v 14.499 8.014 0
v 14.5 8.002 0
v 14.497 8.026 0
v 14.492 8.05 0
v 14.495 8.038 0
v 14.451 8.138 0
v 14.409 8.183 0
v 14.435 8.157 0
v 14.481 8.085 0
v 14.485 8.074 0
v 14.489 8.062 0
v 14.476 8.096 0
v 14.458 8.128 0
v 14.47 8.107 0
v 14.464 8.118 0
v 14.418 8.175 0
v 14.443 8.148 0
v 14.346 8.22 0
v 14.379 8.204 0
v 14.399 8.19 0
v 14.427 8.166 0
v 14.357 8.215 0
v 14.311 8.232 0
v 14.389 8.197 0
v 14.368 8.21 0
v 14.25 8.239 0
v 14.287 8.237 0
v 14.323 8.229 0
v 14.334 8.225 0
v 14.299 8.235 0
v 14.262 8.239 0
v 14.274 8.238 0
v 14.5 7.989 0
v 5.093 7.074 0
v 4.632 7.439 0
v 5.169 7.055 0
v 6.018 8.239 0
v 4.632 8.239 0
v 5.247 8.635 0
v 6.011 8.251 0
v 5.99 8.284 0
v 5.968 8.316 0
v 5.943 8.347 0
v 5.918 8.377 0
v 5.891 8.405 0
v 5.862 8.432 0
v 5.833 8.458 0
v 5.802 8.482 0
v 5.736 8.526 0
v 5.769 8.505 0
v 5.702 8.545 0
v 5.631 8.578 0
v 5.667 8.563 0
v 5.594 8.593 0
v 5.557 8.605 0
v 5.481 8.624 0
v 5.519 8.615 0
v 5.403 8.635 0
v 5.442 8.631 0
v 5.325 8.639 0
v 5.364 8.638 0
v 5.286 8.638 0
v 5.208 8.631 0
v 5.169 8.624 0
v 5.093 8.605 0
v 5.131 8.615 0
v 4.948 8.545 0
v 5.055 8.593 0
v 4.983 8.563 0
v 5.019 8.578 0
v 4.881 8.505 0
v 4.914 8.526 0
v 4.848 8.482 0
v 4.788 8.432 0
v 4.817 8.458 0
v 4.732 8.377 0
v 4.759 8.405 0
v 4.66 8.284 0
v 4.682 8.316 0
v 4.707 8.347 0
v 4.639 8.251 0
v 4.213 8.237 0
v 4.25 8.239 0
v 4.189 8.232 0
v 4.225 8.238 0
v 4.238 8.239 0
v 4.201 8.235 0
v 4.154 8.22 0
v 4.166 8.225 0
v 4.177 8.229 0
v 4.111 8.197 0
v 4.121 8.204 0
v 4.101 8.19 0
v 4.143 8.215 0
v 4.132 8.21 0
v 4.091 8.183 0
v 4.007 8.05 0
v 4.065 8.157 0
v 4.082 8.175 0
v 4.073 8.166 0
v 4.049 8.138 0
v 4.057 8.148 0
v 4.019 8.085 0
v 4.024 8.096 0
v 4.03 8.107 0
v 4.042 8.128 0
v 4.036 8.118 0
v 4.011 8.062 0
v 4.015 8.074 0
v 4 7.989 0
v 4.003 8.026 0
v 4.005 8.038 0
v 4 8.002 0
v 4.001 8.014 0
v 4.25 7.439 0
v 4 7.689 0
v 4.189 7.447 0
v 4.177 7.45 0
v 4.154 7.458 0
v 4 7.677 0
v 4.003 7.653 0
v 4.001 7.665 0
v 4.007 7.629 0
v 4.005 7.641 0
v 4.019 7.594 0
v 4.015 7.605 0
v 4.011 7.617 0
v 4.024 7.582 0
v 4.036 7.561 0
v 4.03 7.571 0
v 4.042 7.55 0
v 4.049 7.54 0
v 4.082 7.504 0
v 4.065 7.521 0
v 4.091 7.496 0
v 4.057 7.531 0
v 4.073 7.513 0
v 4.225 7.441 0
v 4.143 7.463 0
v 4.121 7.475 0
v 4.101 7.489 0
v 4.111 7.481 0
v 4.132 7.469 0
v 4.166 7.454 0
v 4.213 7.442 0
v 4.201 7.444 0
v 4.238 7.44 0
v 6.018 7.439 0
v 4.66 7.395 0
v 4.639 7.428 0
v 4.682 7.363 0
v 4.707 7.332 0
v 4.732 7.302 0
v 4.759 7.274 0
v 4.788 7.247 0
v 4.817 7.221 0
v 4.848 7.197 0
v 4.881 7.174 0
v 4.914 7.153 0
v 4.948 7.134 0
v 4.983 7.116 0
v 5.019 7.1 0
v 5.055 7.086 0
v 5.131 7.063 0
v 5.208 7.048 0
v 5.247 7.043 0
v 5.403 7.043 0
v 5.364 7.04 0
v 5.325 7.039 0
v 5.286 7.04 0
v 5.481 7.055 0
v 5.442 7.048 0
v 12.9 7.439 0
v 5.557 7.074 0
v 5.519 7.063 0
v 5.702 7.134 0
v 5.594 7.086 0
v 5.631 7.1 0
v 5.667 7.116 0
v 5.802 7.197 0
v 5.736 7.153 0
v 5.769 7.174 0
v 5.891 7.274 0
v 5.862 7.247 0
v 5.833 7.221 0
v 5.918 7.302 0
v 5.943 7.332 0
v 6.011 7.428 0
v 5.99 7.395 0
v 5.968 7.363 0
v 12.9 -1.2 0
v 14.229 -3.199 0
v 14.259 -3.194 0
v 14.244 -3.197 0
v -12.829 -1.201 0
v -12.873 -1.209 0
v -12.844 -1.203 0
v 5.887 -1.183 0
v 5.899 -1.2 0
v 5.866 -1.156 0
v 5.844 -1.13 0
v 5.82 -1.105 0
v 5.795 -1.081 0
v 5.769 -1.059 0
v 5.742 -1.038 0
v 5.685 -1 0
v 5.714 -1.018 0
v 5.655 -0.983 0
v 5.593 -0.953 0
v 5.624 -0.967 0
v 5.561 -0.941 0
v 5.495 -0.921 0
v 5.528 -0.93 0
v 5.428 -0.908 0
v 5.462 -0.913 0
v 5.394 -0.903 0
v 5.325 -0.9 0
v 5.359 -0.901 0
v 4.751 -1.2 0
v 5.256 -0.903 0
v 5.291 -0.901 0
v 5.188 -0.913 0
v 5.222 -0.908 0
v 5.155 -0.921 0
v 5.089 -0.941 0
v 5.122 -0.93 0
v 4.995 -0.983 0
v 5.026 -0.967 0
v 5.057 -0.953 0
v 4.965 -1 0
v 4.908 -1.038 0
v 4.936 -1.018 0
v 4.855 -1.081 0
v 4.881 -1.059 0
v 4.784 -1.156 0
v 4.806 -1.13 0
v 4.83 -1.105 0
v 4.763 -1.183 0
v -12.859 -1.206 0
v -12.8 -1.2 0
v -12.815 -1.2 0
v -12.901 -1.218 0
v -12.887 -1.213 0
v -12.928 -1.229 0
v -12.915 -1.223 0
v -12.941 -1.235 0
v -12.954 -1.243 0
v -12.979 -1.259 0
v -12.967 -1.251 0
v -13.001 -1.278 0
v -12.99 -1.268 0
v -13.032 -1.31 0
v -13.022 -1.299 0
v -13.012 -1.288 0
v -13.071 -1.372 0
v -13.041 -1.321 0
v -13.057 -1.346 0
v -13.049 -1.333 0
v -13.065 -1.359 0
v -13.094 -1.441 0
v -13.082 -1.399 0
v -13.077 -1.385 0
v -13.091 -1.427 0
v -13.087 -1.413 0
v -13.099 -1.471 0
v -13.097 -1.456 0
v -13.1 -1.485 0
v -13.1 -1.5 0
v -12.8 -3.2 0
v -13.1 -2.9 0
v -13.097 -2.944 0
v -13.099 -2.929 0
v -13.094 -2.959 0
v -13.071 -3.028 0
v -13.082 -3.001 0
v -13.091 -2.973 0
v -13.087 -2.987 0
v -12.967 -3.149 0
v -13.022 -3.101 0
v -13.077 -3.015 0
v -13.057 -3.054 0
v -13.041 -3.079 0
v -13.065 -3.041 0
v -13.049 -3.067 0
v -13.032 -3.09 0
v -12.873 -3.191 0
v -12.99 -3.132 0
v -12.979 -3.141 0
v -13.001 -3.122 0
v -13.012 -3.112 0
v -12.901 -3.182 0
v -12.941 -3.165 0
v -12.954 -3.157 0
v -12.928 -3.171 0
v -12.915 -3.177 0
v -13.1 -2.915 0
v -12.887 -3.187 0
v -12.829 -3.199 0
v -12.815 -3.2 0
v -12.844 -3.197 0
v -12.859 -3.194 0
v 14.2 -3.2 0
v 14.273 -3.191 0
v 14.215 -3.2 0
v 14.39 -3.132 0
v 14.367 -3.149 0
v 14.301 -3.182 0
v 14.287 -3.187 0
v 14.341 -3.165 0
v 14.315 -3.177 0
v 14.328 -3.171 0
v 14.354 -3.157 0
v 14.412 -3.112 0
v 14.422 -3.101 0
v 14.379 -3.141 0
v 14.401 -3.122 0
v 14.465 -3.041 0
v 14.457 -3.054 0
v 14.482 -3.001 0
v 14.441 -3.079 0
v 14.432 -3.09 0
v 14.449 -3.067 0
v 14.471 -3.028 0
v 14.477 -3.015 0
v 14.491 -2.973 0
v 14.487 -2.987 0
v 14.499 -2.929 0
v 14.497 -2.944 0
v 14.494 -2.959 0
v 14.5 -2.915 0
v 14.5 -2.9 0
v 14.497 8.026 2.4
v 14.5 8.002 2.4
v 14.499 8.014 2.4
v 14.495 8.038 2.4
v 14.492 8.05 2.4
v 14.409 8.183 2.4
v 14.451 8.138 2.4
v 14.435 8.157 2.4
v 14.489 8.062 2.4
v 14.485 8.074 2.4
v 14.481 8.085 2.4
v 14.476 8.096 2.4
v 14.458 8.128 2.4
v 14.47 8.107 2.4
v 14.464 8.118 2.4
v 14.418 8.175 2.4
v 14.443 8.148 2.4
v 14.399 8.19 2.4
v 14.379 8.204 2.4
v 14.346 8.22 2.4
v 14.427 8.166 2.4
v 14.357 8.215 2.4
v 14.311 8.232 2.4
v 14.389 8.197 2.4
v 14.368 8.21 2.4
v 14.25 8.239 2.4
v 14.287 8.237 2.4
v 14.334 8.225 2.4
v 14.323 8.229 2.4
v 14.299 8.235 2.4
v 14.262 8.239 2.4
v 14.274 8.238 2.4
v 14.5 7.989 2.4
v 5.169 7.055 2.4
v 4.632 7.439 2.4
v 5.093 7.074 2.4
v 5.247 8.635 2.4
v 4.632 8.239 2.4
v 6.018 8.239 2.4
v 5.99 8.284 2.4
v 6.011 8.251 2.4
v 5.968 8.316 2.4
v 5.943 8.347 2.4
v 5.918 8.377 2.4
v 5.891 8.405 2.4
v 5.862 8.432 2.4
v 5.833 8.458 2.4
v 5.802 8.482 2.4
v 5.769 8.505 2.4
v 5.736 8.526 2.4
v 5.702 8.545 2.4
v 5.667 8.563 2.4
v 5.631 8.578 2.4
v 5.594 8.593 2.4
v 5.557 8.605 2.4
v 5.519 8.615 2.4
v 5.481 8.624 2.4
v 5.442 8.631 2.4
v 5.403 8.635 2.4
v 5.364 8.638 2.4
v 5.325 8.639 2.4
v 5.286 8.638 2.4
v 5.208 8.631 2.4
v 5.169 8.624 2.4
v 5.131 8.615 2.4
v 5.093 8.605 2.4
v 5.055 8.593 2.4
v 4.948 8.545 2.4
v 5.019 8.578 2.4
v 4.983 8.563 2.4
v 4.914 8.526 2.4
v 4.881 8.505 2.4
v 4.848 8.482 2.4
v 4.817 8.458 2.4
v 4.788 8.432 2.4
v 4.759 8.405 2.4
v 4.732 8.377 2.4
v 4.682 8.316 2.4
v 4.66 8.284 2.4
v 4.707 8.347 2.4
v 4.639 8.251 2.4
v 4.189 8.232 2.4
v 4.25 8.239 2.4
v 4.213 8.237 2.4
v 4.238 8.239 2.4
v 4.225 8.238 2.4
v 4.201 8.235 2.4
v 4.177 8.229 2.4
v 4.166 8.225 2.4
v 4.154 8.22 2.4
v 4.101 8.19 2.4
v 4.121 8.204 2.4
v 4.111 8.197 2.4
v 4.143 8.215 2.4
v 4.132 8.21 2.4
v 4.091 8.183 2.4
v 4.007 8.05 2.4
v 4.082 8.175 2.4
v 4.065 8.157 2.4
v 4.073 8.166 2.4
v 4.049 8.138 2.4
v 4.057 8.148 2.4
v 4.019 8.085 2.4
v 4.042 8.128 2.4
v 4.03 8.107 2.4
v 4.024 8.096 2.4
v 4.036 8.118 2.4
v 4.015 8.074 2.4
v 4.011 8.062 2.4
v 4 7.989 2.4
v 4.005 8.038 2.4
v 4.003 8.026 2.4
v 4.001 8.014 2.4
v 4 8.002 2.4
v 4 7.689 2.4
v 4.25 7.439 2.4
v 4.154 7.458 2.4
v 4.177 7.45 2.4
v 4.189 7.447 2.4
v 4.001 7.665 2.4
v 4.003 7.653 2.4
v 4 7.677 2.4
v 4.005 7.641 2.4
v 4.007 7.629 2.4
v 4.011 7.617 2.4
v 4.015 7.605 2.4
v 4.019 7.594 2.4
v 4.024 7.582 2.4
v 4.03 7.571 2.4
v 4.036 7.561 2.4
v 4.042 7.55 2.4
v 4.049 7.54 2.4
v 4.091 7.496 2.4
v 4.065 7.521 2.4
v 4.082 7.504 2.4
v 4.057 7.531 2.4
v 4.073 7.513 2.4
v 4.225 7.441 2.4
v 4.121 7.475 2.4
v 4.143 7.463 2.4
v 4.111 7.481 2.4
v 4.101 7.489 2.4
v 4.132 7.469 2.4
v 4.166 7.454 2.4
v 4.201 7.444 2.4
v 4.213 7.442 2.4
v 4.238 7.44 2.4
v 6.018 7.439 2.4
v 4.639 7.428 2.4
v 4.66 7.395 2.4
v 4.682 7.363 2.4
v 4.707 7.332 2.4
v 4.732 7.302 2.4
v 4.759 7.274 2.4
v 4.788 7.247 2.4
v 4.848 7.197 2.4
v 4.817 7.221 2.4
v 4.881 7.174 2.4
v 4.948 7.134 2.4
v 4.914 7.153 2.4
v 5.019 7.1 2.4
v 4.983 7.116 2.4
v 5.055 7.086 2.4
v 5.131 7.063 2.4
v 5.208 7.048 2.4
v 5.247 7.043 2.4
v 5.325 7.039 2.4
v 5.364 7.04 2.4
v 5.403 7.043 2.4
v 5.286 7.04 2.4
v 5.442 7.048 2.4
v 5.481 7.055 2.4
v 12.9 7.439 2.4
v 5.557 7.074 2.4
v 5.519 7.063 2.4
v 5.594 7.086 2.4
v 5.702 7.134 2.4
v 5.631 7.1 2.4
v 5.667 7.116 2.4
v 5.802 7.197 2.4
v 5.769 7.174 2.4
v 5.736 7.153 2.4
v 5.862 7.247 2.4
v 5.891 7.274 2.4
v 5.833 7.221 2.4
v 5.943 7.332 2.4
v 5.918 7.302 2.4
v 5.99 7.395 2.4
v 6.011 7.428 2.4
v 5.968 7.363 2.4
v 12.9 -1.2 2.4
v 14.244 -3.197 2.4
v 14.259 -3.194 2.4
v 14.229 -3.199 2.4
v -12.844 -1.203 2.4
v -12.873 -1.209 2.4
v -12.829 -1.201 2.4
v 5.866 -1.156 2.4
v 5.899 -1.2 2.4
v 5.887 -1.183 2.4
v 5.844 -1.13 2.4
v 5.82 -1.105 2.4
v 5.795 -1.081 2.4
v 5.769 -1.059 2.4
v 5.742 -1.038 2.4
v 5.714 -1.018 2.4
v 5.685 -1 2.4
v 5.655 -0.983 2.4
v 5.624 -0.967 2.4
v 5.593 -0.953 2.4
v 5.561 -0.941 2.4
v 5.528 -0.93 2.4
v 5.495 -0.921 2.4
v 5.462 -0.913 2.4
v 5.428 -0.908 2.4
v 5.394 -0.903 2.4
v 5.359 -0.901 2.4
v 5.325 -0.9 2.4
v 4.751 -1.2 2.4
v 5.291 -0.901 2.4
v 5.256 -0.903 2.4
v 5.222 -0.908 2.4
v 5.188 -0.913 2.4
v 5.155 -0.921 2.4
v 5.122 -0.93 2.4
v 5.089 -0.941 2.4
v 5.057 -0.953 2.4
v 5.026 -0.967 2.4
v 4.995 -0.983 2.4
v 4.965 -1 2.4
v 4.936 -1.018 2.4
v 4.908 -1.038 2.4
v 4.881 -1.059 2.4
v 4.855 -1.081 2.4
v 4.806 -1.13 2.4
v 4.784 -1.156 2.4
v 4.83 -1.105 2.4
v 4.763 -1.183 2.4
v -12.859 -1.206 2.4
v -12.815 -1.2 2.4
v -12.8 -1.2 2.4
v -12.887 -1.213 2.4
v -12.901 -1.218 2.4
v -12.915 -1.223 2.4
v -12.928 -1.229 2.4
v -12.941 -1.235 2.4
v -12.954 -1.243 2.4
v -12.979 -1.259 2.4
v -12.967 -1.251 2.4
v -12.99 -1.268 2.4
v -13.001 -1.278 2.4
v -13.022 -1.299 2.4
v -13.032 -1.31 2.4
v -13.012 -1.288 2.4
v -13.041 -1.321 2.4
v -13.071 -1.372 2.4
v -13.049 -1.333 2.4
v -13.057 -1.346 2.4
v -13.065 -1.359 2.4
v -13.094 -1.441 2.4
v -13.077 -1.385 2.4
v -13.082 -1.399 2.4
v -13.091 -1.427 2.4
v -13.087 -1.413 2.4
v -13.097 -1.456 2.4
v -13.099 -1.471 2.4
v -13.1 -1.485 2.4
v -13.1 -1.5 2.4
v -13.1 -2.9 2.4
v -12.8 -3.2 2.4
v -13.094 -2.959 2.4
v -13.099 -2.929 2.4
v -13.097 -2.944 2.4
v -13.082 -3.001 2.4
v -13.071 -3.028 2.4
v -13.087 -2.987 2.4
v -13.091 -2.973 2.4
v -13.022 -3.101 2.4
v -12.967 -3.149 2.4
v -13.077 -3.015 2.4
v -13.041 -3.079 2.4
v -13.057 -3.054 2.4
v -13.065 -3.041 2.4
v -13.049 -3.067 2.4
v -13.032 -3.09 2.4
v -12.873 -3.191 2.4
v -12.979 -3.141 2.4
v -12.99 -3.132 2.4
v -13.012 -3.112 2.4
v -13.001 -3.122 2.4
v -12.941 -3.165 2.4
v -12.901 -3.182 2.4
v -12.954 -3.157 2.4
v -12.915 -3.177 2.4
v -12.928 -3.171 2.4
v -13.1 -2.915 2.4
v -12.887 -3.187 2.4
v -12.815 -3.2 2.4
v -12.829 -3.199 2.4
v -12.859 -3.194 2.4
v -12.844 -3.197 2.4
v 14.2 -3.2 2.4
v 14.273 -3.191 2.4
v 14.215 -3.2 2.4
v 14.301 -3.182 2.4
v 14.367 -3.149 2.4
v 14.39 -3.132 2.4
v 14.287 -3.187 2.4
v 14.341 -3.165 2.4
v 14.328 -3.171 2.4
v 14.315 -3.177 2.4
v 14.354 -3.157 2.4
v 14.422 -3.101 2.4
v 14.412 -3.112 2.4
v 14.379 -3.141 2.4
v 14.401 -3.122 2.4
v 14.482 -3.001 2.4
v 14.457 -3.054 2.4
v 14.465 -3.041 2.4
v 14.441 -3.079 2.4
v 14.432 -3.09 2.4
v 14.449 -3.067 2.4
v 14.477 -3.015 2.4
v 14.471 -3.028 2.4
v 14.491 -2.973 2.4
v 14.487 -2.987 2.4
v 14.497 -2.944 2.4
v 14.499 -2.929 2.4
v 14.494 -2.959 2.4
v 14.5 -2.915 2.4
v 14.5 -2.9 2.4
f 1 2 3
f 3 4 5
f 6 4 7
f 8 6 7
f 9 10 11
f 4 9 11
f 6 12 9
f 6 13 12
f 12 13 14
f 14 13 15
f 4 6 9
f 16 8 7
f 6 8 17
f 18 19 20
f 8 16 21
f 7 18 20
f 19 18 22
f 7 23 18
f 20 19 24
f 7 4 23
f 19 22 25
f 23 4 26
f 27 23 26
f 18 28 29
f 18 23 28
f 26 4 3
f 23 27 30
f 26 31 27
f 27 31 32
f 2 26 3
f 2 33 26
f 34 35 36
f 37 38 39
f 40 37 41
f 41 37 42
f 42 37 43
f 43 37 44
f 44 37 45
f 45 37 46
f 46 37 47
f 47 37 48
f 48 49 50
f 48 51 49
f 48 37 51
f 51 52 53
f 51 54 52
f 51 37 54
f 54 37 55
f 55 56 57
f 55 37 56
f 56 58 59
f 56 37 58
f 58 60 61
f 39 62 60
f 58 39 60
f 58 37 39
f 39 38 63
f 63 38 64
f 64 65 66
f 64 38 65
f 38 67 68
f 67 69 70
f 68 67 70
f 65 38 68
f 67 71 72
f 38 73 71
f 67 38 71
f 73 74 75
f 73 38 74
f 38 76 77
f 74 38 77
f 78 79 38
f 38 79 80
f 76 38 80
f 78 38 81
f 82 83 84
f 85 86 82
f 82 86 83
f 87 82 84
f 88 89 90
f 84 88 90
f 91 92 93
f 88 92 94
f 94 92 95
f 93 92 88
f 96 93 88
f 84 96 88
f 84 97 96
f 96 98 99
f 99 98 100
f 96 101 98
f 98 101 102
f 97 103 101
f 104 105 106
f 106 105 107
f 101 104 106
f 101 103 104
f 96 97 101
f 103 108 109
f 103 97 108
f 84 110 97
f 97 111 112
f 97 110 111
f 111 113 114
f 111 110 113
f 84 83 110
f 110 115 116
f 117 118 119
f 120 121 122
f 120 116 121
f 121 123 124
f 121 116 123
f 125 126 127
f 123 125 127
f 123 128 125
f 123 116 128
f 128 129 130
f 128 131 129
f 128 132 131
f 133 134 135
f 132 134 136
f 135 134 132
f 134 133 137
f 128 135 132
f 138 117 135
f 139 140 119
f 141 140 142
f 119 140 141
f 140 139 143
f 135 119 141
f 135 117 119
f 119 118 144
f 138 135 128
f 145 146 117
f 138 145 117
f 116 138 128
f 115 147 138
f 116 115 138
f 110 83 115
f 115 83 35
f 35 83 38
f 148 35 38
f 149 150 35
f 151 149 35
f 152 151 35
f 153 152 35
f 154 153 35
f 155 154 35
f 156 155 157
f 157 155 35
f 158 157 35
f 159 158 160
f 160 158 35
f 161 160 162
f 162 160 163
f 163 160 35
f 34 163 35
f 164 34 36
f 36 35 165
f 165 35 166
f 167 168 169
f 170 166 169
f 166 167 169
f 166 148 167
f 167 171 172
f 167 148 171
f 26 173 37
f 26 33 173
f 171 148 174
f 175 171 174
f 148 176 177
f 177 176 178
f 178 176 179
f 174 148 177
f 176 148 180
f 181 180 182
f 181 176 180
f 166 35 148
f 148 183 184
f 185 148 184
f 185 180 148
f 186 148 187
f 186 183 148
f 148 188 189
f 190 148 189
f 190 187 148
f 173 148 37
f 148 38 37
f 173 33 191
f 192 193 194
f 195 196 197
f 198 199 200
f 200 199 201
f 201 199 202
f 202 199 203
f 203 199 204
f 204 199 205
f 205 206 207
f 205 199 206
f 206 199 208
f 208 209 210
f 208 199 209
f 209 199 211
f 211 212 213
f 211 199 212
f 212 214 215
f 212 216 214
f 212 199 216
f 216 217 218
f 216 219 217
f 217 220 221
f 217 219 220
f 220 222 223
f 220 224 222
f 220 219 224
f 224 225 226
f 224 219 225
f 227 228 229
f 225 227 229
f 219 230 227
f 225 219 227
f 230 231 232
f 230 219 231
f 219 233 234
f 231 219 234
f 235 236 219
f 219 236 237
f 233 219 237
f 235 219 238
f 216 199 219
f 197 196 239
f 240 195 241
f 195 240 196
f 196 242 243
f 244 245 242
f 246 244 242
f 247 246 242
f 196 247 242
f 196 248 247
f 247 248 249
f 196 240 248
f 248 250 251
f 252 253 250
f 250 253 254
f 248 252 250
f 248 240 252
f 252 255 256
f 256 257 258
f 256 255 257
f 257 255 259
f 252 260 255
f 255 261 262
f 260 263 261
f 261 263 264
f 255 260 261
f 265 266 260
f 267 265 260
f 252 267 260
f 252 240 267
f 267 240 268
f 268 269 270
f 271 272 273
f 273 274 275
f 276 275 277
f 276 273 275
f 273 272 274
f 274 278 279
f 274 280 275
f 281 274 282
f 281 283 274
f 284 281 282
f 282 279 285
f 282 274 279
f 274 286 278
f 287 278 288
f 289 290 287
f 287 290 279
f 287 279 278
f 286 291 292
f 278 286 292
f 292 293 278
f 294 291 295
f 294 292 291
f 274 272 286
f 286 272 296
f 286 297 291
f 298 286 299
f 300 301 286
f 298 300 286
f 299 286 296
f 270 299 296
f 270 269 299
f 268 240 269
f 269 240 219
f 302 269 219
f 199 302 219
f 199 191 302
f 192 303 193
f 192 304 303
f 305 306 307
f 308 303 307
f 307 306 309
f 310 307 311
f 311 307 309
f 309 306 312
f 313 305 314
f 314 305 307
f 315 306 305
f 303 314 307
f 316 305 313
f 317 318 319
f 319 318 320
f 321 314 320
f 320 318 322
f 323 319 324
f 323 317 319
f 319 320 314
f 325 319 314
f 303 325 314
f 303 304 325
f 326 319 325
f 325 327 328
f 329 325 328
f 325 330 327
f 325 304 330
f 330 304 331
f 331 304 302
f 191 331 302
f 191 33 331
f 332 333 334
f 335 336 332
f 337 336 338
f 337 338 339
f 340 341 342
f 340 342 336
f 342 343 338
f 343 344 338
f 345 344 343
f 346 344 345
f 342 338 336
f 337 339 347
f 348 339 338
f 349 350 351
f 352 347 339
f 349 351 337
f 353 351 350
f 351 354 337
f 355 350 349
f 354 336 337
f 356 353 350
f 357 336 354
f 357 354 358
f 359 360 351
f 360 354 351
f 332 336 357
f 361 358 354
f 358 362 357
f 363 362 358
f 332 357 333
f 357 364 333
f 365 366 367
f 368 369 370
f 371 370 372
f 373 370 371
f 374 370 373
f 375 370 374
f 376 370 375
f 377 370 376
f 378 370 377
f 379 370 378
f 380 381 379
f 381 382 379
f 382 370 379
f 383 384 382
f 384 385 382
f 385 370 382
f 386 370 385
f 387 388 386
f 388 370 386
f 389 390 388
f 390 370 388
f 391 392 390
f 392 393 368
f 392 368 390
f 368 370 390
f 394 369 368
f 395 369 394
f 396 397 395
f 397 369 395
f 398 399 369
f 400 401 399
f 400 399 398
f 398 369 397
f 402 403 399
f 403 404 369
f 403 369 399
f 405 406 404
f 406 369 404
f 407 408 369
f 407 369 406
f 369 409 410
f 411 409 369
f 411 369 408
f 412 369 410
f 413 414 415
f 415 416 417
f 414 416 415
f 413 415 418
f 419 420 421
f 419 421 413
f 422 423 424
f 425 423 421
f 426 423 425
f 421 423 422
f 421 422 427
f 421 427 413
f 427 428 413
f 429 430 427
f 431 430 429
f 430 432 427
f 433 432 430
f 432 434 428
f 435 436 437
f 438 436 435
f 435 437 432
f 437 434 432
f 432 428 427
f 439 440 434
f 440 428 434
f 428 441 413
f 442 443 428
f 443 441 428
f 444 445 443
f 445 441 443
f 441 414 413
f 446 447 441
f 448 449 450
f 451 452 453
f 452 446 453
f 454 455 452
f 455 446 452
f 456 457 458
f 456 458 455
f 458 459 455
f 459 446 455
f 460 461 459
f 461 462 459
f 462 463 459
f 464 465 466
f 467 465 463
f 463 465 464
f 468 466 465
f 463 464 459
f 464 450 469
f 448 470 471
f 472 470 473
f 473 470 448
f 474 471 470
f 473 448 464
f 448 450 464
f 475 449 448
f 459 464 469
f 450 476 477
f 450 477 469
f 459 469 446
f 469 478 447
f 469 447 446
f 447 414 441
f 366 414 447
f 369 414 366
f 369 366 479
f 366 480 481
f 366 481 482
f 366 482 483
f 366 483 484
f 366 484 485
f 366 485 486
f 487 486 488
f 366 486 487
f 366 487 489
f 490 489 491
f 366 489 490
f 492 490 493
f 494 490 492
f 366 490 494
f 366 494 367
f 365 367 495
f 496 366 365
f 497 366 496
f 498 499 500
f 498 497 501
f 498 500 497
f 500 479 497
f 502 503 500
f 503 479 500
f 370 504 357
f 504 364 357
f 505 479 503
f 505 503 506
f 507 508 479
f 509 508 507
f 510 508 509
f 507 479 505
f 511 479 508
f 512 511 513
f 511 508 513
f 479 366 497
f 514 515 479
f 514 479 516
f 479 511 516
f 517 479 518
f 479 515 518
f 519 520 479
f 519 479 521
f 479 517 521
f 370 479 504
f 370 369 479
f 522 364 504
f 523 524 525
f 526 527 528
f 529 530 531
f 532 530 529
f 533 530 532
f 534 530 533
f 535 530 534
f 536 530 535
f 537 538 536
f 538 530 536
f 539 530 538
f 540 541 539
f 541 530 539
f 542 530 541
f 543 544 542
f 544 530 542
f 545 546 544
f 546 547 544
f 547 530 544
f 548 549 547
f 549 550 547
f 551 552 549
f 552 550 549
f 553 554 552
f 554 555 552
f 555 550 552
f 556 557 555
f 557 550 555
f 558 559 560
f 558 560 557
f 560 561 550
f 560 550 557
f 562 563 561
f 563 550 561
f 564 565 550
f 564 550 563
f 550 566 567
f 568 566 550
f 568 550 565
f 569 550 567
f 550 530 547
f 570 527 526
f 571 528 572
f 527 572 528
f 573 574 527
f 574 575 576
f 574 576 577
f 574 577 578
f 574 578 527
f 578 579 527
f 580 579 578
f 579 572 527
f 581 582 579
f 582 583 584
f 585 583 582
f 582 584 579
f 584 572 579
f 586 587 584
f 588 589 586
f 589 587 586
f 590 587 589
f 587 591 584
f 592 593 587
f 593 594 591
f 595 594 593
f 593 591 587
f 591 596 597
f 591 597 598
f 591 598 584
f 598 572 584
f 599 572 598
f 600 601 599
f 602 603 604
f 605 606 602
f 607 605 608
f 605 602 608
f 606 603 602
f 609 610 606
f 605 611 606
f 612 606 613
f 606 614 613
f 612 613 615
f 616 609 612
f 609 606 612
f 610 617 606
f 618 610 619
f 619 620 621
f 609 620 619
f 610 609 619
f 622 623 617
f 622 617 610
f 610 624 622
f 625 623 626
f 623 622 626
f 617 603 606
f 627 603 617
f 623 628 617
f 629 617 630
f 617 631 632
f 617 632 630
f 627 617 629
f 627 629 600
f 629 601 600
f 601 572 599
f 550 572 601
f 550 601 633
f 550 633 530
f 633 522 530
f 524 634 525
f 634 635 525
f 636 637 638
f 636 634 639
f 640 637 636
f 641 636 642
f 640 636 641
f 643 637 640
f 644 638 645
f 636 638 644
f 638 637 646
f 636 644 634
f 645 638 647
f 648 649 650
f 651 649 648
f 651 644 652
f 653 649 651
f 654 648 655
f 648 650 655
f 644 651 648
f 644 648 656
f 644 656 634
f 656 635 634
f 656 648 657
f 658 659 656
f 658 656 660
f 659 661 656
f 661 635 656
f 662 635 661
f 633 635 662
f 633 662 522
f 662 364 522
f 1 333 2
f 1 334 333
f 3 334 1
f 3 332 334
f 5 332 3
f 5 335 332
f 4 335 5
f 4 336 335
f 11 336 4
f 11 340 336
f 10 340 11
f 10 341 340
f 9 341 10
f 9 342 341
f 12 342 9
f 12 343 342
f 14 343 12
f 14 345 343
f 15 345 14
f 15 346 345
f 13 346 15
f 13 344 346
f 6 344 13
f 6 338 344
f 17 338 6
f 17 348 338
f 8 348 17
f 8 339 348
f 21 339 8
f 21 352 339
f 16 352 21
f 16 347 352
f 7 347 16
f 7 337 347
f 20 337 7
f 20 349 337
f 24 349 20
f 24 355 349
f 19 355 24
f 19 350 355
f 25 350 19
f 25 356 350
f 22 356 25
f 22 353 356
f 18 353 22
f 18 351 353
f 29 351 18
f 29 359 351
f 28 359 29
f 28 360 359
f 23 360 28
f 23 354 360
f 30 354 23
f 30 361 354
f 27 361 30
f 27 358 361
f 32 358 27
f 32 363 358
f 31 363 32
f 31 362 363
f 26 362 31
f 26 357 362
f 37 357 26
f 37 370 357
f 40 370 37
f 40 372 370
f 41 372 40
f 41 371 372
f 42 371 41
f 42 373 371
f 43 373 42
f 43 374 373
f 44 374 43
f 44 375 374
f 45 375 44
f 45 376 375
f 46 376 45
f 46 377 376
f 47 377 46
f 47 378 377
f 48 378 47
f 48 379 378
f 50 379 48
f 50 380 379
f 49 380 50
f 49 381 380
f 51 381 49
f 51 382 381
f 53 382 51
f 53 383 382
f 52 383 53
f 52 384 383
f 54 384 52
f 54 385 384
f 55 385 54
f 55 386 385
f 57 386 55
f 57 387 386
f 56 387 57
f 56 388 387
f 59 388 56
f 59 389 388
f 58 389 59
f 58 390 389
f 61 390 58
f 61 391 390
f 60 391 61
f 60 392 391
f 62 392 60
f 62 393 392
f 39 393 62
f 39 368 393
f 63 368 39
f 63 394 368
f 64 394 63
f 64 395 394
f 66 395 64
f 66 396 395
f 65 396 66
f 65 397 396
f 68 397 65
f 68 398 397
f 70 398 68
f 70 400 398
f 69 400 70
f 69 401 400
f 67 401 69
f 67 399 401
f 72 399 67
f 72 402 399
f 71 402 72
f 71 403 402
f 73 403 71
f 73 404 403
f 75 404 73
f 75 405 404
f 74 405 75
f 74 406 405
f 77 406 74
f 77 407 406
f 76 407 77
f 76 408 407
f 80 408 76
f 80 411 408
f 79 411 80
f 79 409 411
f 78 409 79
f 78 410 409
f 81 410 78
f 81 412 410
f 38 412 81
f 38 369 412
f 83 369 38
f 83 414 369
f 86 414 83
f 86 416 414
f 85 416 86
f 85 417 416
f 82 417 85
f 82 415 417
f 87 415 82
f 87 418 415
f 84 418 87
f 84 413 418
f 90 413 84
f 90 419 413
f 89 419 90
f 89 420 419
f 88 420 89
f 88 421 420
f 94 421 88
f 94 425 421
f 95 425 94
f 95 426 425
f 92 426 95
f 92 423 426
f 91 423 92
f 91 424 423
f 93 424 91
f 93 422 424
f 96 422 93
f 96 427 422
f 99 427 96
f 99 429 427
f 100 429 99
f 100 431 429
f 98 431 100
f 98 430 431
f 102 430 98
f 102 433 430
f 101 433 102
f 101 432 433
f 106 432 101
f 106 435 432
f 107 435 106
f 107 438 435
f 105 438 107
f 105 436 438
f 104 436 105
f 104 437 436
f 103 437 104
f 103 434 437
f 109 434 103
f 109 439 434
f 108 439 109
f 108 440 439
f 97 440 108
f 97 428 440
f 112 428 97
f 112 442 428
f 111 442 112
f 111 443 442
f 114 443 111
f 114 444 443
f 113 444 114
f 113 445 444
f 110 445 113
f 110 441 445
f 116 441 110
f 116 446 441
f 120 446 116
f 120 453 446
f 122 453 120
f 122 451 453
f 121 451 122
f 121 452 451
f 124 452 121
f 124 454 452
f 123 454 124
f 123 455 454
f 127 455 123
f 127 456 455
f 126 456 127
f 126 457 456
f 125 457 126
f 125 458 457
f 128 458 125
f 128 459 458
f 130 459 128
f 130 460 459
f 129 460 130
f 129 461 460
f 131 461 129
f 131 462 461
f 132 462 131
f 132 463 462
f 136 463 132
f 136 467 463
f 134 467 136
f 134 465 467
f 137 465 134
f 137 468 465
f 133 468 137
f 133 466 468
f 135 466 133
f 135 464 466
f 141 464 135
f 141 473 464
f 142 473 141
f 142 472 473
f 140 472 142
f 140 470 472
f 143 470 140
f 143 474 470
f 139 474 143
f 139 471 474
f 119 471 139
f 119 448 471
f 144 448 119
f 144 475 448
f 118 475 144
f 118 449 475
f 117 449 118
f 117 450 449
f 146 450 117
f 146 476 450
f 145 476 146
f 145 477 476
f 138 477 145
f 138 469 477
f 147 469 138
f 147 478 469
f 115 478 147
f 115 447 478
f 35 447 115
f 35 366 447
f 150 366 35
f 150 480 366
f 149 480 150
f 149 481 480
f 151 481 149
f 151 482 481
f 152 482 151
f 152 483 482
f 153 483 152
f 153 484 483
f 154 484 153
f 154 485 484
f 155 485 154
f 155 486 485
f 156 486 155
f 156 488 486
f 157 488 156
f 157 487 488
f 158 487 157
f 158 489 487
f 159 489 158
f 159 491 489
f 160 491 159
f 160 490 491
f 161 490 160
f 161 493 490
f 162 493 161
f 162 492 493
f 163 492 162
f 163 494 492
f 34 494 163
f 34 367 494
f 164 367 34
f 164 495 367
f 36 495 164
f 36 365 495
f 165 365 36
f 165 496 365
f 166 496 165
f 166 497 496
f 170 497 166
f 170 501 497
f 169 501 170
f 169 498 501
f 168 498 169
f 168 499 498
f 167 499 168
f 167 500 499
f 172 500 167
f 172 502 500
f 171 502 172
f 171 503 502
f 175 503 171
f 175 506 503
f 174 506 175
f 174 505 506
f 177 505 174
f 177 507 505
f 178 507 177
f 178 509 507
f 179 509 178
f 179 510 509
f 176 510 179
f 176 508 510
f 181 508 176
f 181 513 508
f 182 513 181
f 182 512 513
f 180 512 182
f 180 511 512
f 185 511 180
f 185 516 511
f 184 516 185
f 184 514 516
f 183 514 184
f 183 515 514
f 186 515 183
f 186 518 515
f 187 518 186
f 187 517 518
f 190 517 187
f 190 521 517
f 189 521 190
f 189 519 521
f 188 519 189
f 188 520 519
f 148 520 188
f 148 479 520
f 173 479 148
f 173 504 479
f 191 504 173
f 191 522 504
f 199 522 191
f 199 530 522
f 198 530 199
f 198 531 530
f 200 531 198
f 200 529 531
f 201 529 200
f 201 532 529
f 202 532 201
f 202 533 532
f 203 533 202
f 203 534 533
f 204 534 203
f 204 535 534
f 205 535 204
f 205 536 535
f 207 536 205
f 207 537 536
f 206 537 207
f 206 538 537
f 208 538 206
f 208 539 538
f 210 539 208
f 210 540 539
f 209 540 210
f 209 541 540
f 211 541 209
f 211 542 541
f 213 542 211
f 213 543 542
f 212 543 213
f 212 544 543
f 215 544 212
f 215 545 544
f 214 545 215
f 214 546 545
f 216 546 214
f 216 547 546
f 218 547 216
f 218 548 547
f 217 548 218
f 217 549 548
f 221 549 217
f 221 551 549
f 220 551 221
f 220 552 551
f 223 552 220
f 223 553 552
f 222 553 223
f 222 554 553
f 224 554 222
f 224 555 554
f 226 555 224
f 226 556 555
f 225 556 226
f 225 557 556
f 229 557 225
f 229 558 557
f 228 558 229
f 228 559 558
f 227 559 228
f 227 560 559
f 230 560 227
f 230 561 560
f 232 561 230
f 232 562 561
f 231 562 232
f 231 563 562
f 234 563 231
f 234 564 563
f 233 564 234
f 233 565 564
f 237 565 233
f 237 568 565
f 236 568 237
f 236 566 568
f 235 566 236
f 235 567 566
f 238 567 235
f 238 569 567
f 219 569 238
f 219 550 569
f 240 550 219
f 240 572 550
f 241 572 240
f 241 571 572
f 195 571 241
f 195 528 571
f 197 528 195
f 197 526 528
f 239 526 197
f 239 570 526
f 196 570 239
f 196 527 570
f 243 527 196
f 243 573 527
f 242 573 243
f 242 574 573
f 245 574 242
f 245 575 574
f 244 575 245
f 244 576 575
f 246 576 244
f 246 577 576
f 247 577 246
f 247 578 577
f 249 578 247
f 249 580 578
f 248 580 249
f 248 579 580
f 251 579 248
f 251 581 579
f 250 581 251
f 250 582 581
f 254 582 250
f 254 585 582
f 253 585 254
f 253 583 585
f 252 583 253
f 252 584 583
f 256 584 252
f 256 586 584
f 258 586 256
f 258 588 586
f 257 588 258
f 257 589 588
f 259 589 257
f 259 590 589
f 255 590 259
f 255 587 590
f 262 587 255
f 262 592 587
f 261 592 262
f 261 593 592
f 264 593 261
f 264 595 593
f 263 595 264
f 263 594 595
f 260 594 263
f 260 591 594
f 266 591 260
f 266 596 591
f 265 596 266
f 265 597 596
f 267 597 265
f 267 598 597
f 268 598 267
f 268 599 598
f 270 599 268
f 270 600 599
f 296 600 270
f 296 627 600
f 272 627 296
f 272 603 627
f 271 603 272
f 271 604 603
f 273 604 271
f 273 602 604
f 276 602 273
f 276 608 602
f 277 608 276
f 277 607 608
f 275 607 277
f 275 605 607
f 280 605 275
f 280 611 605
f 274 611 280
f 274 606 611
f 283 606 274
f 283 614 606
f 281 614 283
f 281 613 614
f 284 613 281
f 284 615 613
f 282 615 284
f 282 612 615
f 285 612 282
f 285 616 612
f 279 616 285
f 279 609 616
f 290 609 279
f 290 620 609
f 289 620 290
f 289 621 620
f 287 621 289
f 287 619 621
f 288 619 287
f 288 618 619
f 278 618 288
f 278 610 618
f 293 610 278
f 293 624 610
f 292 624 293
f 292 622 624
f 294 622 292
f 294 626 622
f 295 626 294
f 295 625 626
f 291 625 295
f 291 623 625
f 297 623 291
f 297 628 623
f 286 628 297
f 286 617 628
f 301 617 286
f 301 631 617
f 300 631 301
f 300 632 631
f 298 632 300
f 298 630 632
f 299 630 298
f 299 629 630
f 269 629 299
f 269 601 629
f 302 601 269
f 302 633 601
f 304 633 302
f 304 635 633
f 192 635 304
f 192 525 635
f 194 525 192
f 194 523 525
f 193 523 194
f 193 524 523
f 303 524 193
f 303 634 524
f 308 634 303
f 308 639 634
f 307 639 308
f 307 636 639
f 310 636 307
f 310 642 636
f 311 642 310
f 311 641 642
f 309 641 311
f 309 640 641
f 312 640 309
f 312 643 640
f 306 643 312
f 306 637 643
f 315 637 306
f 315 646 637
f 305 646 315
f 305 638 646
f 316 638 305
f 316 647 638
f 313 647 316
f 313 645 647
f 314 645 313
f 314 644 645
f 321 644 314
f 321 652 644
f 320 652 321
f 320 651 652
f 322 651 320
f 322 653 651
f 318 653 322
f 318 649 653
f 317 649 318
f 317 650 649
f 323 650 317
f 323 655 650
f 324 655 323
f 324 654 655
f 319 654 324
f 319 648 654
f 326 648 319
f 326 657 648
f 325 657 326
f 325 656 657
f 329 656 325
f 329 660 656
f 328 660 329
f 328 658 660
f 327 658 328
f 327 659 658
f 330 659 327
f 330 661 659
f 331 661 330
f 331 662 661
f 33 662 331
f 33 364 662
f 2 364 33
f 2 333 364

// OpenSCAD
// Clipe em C para a borda longa da lamina: PC, imprimir DE LADO, sem suportes.
// Esta vista e a orientacao de impressao. X/Y do desenho sao Y/Z na montagem.
$fn=128;
largura=2.4;             // espessura da peca no eixo longitudinal da lamina
pre_carga=0.15;          // reducao da abertura livre em relacao ao conjunto nominal
altura_TPU=7.189333365;  // altura real da regiao pressionada no sapato
folha=0.8;
z_superior=altura_TPU-pre_carga+0.4+folha/2;
module retangulo_arredondado(x0,y0,x1,y1,r) {
 hull() for(x=[x0+r,x1-r],y=[y0+r,y1-r]) translate([x,y]) circle(r=r);
}
linear_extrude(height=largura) union() {
 retangulo_arredondado(-13.1,-3.2,14.5,-1.2,.3);
 retangulo_arredondado(12.9,-3.2,14.5,z_superior+folha/2,.35);
 retangulo_arredondado(4.0,z_superior-folha/2,14.5,z_superior+folha/2,.25);
 translate([5.325,altura_TPU-pre_carga+.8]) circle(r=.8);
 translate([5.325,-1.6]) circle(r=.7);
}
